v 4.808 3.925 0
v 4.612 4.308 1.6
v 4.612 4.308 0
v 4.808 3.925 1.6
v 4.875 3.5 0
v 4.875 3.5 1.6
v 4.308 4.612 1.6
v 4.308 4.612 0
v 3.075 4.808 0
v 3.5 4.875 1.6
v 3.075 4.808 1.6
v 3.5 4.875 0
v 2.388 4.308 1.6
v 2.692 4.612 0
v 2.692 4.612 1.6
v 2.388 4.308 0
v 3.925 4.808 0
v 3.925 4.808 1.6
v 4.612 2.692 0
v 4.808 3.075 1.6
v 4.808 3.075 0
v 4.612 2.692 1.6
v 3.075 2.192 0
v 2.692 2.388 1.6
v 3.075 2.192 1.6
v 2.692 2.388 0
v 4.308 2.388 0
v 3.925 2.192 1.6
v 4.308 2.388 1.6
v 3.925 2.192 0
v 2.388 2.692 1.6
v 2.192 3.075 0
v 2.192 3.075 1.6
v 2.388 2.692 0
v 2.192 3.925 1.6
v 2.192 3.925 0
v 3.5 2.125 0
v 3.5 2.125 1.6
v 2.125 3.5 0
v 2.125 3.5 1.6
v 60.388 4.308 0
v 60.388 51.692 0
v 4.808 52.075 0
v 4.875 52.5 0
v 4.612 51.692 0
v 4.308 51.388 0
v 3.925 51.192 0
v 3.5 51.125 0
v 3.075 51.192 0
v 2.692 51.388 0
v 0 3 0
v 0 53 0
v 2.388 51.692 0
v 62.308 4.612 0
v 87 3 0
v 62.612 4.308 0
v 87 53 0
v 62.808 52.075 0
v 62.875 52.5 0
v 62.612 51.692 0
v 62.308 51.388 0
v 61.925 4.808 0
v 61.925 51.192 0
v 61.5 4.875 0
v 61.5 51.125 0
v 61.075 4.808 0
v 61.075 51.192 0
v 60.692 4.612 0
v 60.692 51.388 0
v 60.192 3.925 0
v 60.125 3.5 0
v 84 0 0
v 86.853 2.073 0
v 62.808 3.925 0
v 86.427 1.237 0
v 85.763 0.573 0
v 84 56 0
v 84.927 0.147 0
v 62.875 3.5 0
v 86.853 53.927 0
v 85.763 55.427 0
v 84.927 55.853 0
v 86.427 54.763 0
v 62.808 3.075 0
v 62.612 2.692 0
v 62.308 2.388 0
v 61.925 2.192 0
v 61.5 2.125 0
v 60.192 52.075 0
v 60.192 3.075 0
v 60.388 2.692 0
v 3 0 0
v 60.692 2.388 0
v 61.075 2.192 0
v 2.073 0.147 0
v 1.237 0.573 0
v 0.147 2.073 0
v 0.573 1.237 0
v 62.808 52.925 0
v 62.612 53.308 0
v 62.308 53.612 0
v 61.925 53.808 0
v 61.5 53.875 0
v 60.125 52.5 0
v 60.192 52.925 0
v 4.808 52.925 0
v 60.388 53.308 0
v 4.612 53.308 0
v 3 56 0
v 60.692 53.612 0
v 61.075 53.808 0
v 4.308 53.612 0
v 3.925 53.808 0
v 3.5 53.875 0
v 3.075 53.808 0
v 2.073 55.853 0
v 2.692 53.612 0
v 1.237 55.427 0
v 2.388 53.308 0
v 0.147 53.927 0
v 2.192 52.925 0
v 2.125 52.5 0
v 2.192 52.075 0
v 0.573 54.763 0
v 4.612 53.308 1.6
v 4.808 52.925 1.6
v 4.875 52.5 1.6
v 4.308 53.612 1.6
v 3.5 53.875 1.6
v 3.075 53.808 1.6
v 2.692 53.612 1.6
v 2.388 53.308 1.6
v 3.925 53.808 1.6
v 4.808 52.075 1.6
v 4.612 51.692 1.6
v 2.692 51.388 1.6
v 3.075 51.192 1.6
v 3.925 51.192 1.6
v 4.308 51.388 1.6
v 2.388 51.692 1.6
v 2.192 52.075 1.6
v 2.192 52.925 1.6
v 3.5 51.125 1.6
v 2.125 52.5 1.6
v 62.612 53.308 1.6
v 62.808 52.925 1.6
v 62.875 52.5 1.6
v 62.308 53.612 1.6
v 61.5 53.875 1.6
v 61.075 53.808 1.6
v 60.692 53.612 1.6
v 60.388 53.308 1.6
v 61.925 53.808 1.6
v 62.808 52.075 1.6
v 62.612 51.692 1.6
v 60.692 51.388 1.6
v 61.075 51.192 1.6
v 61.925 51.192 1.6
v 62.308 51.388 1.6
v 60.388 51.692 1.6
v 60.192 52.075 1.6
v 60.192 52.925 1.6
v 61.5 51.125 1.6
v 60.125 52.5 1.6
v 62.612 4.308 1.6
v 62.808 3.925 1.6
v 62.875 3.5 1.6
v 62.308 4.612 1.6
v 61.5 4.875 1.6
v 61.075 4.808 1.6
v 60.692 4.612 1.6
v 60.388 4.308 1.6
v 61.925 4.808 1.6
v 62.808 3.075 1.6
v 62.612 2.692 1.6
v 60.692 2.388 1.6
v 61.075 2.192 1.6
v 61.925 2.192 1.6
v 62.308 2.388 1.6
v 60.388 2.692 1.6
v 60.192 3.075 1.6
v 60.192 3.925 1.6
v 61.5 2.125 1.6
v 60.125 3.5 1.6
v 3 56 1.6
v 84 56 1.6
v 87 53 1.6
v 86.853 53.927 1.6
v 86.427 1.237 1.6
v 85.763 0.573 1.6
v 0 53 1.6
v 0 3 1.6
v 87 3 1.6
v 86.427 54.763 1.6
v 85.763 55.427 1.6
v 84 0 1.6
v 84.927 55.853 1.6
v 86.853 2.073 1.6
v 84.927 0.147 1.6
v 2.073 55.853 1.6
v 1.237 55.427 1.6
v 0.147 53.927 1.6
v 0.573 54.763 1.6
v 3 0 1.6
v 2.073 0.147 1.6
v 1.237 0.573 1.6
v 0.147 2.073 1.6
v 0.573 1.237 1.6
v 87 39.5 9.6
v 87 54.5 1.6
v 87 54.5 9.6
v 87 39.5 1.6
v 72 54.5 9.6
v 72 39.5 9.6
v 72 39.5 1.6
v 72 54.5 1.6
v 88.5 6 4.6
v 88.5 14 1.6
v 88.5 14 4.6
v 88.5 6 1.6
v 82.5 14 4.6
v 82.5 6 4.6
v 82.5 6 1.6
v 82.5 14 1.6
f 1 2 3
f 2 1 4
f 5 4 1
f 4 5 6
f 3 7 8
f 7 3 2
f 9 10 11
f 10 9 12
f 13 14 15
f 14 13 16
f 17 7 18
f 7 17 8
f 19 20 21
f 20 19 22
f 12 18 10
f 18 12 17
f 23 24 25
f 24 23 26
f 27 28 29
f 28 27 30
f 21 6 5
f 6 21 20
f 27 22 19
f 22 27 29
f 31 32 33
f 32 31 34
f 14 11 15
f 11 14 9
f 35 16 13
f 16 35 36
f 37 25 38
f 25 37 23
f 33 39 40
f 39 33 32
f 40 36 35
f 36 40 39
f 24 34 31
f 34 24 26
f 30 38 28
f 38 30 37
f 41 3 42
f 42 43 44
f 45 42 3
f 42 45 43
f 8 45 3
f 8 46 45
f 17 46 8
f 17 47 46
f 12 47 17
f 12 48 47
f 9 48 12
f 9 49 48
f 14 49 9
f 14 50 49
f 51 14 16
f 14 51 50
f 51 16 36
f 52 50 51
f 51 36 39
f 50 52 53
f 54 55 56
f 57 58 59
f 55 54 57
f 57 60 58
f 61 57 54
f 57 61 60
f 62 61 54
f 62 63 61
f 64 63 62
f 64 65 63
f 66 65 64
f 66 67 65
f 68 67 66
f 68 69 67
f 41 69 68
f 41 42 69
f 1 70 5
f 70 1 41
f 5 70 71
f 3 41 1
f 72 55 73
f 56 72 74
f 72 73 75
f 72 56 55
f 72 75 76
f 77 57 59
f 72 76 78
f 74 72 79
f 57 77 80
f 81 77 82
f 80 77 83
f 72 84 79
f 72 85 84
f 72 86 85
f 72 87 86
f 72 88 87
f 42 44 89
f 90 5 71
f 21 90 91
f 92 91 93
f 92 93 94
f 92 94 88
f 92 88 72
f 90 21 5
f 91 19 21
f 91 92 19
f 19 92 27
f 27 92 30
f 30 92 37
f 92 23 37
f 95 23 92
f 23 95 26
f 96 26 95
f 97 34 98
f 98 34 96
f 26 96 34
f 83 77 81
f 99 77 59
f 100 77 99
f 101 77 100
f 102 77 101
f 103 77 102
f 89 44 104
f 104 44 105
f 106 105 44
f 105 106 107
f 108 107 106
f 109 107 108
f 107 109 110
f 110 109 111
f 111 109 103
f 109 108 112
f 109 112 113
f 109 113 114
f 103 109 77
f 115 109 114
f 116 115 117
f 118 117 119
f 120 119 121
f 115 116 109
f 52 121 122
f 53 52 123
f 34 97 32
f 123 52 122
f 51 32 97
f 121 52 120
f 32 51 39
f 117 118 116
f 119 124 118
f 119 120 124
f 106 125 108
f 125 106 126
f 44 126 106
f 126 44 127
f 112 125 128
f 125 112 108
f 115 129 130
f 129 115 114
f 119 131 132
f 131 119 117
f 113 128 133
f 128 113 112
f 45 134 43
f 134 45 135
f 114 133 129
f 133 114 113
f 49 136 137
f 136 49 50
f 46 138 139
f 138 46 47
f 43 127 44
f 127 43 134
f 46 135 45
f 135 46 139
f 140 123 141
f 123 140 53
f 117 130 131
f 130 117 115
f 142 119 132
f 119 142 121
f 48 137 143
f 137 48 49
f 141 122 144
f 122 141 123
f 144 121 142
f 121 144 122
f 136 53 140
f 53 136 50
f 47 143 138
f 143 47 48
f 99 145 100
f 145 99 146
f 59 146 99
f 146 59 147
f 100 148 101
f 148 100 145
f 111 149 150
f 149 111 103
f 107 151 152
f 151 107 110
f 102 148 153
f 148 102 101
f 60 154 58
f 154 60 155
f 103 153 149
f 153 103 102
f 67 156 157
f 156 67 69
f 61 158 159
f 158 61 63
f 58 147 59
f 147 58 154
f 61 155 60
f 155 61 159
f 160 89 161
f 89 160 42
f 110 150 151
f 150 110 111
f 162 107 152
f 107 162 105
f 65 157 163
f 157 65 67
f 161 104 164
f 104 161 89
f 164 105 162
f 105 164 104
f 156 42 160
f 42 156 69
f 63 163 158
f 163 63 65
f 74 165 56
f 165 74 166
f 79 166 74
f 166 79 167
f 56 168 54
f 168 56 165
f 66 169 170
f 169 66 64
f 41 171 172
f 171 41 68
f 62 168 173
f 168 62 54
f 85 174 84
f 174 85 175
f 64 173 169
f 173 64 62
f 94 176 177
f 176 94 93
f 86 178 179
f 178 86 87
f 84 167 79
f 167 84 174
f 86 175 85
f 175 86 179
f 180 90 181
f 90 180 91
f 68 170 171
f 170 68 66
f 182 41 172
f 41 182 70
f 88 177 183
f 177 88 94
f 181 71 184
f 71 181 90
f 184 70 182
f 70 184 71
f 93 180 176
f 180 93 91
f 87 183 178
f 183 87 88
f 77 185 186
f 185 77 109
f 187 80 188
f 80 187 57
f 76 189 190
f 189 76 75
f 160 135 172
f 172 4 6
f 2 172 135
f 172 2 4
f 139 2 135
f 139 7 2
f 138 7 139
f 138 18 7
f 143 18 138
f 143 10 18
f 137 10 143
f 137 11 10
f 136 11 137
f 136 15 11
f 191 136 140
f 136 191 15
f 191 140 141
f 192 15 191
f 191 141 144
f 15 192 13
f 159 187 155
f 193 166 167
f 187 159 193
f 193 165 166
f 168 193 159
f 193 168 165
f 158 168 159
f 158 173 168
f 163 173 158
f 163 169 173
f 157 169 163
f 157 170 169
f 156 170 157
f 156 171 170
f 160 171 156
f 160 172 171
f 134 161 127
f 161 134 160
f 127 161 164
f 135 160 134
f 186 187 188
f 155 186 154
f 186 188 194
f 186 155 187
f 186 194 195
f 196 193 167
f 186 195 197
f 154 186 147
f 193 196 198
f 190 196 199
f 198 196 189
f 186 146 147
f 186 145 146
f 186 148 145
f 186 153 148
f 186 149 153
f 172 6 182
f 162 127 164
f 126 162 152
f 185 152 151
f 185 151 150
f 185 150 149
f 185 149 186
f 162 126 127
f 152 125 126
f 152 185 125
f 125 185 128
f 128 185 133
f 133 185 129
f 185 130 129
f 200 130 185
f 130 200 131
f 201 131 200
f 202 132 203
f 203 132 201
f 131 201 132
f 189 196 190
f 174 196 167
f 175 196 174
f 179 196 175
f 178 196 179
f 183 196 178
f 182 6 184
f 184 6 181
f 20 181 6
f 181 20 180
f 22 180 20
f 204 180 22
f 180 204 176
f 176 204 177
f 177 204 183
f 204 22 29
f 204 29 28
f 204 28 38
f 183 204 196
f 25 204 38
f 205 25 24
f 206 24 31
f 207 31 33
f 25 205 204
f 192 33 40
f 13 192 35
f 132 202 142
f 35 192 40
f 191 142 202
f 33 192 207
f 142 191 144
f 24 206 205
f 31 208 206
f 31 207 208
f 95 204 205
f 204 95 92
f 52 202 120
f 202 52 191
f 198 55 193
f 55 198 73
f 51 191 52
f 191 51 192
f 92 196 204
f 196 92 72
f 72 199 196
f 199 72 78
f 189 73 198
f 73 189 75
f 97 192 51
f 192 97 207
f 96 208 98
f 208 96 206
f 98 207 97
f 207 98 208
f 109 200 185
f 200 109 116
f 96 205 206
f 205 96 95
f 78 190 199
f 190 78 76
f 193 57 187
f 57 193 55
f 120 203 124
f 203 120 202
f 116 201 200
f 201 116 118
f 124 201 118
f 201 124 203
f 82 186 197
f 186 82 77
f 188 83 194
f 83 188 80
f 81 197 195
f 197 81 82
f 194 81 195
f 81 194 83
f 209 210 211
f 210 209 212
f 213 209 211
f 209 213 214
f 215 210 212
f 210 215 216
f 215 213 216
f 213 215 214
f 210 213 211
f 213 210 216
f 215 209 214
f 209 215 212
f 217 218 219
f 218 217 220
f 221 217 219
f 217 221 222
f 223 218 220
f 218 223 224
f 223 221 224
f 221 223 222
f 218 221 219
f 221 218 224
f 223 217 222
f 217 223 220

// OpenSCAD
$fn = 20;

board_x=87;
board_y=56;
board_z=1.6;
board_r=3;
board_hole_d=2.75;
board_holes=[
  [3.5, 3.5],
  [3.5, 52.5],
  [61.5, 52.5],
  [61.5, 3.5]
];

x860();

module x860()
{
  color("green") difference()
  {
    translate([board_r, board_r, 0])
    minkowski()
    {
      cube([board_x - board_r*2, board_y-board_r*2, board_z/2]);
      cylinder(r=board_r, h=board_z/2);
    }
    
    for(hole = board_holes) {
      translate(hole)
      cylinder(d=board_hole_d, h=board_z);
    };
  }
  
  // usb
  translate([board_x - 15, 39.5, board_z]) 
  cube([15, 15, 8]);
  
  // micro usb
  translate([board_x - 4.5, 6, board_z]) 
  cube([6, 8, 3]);  
}
